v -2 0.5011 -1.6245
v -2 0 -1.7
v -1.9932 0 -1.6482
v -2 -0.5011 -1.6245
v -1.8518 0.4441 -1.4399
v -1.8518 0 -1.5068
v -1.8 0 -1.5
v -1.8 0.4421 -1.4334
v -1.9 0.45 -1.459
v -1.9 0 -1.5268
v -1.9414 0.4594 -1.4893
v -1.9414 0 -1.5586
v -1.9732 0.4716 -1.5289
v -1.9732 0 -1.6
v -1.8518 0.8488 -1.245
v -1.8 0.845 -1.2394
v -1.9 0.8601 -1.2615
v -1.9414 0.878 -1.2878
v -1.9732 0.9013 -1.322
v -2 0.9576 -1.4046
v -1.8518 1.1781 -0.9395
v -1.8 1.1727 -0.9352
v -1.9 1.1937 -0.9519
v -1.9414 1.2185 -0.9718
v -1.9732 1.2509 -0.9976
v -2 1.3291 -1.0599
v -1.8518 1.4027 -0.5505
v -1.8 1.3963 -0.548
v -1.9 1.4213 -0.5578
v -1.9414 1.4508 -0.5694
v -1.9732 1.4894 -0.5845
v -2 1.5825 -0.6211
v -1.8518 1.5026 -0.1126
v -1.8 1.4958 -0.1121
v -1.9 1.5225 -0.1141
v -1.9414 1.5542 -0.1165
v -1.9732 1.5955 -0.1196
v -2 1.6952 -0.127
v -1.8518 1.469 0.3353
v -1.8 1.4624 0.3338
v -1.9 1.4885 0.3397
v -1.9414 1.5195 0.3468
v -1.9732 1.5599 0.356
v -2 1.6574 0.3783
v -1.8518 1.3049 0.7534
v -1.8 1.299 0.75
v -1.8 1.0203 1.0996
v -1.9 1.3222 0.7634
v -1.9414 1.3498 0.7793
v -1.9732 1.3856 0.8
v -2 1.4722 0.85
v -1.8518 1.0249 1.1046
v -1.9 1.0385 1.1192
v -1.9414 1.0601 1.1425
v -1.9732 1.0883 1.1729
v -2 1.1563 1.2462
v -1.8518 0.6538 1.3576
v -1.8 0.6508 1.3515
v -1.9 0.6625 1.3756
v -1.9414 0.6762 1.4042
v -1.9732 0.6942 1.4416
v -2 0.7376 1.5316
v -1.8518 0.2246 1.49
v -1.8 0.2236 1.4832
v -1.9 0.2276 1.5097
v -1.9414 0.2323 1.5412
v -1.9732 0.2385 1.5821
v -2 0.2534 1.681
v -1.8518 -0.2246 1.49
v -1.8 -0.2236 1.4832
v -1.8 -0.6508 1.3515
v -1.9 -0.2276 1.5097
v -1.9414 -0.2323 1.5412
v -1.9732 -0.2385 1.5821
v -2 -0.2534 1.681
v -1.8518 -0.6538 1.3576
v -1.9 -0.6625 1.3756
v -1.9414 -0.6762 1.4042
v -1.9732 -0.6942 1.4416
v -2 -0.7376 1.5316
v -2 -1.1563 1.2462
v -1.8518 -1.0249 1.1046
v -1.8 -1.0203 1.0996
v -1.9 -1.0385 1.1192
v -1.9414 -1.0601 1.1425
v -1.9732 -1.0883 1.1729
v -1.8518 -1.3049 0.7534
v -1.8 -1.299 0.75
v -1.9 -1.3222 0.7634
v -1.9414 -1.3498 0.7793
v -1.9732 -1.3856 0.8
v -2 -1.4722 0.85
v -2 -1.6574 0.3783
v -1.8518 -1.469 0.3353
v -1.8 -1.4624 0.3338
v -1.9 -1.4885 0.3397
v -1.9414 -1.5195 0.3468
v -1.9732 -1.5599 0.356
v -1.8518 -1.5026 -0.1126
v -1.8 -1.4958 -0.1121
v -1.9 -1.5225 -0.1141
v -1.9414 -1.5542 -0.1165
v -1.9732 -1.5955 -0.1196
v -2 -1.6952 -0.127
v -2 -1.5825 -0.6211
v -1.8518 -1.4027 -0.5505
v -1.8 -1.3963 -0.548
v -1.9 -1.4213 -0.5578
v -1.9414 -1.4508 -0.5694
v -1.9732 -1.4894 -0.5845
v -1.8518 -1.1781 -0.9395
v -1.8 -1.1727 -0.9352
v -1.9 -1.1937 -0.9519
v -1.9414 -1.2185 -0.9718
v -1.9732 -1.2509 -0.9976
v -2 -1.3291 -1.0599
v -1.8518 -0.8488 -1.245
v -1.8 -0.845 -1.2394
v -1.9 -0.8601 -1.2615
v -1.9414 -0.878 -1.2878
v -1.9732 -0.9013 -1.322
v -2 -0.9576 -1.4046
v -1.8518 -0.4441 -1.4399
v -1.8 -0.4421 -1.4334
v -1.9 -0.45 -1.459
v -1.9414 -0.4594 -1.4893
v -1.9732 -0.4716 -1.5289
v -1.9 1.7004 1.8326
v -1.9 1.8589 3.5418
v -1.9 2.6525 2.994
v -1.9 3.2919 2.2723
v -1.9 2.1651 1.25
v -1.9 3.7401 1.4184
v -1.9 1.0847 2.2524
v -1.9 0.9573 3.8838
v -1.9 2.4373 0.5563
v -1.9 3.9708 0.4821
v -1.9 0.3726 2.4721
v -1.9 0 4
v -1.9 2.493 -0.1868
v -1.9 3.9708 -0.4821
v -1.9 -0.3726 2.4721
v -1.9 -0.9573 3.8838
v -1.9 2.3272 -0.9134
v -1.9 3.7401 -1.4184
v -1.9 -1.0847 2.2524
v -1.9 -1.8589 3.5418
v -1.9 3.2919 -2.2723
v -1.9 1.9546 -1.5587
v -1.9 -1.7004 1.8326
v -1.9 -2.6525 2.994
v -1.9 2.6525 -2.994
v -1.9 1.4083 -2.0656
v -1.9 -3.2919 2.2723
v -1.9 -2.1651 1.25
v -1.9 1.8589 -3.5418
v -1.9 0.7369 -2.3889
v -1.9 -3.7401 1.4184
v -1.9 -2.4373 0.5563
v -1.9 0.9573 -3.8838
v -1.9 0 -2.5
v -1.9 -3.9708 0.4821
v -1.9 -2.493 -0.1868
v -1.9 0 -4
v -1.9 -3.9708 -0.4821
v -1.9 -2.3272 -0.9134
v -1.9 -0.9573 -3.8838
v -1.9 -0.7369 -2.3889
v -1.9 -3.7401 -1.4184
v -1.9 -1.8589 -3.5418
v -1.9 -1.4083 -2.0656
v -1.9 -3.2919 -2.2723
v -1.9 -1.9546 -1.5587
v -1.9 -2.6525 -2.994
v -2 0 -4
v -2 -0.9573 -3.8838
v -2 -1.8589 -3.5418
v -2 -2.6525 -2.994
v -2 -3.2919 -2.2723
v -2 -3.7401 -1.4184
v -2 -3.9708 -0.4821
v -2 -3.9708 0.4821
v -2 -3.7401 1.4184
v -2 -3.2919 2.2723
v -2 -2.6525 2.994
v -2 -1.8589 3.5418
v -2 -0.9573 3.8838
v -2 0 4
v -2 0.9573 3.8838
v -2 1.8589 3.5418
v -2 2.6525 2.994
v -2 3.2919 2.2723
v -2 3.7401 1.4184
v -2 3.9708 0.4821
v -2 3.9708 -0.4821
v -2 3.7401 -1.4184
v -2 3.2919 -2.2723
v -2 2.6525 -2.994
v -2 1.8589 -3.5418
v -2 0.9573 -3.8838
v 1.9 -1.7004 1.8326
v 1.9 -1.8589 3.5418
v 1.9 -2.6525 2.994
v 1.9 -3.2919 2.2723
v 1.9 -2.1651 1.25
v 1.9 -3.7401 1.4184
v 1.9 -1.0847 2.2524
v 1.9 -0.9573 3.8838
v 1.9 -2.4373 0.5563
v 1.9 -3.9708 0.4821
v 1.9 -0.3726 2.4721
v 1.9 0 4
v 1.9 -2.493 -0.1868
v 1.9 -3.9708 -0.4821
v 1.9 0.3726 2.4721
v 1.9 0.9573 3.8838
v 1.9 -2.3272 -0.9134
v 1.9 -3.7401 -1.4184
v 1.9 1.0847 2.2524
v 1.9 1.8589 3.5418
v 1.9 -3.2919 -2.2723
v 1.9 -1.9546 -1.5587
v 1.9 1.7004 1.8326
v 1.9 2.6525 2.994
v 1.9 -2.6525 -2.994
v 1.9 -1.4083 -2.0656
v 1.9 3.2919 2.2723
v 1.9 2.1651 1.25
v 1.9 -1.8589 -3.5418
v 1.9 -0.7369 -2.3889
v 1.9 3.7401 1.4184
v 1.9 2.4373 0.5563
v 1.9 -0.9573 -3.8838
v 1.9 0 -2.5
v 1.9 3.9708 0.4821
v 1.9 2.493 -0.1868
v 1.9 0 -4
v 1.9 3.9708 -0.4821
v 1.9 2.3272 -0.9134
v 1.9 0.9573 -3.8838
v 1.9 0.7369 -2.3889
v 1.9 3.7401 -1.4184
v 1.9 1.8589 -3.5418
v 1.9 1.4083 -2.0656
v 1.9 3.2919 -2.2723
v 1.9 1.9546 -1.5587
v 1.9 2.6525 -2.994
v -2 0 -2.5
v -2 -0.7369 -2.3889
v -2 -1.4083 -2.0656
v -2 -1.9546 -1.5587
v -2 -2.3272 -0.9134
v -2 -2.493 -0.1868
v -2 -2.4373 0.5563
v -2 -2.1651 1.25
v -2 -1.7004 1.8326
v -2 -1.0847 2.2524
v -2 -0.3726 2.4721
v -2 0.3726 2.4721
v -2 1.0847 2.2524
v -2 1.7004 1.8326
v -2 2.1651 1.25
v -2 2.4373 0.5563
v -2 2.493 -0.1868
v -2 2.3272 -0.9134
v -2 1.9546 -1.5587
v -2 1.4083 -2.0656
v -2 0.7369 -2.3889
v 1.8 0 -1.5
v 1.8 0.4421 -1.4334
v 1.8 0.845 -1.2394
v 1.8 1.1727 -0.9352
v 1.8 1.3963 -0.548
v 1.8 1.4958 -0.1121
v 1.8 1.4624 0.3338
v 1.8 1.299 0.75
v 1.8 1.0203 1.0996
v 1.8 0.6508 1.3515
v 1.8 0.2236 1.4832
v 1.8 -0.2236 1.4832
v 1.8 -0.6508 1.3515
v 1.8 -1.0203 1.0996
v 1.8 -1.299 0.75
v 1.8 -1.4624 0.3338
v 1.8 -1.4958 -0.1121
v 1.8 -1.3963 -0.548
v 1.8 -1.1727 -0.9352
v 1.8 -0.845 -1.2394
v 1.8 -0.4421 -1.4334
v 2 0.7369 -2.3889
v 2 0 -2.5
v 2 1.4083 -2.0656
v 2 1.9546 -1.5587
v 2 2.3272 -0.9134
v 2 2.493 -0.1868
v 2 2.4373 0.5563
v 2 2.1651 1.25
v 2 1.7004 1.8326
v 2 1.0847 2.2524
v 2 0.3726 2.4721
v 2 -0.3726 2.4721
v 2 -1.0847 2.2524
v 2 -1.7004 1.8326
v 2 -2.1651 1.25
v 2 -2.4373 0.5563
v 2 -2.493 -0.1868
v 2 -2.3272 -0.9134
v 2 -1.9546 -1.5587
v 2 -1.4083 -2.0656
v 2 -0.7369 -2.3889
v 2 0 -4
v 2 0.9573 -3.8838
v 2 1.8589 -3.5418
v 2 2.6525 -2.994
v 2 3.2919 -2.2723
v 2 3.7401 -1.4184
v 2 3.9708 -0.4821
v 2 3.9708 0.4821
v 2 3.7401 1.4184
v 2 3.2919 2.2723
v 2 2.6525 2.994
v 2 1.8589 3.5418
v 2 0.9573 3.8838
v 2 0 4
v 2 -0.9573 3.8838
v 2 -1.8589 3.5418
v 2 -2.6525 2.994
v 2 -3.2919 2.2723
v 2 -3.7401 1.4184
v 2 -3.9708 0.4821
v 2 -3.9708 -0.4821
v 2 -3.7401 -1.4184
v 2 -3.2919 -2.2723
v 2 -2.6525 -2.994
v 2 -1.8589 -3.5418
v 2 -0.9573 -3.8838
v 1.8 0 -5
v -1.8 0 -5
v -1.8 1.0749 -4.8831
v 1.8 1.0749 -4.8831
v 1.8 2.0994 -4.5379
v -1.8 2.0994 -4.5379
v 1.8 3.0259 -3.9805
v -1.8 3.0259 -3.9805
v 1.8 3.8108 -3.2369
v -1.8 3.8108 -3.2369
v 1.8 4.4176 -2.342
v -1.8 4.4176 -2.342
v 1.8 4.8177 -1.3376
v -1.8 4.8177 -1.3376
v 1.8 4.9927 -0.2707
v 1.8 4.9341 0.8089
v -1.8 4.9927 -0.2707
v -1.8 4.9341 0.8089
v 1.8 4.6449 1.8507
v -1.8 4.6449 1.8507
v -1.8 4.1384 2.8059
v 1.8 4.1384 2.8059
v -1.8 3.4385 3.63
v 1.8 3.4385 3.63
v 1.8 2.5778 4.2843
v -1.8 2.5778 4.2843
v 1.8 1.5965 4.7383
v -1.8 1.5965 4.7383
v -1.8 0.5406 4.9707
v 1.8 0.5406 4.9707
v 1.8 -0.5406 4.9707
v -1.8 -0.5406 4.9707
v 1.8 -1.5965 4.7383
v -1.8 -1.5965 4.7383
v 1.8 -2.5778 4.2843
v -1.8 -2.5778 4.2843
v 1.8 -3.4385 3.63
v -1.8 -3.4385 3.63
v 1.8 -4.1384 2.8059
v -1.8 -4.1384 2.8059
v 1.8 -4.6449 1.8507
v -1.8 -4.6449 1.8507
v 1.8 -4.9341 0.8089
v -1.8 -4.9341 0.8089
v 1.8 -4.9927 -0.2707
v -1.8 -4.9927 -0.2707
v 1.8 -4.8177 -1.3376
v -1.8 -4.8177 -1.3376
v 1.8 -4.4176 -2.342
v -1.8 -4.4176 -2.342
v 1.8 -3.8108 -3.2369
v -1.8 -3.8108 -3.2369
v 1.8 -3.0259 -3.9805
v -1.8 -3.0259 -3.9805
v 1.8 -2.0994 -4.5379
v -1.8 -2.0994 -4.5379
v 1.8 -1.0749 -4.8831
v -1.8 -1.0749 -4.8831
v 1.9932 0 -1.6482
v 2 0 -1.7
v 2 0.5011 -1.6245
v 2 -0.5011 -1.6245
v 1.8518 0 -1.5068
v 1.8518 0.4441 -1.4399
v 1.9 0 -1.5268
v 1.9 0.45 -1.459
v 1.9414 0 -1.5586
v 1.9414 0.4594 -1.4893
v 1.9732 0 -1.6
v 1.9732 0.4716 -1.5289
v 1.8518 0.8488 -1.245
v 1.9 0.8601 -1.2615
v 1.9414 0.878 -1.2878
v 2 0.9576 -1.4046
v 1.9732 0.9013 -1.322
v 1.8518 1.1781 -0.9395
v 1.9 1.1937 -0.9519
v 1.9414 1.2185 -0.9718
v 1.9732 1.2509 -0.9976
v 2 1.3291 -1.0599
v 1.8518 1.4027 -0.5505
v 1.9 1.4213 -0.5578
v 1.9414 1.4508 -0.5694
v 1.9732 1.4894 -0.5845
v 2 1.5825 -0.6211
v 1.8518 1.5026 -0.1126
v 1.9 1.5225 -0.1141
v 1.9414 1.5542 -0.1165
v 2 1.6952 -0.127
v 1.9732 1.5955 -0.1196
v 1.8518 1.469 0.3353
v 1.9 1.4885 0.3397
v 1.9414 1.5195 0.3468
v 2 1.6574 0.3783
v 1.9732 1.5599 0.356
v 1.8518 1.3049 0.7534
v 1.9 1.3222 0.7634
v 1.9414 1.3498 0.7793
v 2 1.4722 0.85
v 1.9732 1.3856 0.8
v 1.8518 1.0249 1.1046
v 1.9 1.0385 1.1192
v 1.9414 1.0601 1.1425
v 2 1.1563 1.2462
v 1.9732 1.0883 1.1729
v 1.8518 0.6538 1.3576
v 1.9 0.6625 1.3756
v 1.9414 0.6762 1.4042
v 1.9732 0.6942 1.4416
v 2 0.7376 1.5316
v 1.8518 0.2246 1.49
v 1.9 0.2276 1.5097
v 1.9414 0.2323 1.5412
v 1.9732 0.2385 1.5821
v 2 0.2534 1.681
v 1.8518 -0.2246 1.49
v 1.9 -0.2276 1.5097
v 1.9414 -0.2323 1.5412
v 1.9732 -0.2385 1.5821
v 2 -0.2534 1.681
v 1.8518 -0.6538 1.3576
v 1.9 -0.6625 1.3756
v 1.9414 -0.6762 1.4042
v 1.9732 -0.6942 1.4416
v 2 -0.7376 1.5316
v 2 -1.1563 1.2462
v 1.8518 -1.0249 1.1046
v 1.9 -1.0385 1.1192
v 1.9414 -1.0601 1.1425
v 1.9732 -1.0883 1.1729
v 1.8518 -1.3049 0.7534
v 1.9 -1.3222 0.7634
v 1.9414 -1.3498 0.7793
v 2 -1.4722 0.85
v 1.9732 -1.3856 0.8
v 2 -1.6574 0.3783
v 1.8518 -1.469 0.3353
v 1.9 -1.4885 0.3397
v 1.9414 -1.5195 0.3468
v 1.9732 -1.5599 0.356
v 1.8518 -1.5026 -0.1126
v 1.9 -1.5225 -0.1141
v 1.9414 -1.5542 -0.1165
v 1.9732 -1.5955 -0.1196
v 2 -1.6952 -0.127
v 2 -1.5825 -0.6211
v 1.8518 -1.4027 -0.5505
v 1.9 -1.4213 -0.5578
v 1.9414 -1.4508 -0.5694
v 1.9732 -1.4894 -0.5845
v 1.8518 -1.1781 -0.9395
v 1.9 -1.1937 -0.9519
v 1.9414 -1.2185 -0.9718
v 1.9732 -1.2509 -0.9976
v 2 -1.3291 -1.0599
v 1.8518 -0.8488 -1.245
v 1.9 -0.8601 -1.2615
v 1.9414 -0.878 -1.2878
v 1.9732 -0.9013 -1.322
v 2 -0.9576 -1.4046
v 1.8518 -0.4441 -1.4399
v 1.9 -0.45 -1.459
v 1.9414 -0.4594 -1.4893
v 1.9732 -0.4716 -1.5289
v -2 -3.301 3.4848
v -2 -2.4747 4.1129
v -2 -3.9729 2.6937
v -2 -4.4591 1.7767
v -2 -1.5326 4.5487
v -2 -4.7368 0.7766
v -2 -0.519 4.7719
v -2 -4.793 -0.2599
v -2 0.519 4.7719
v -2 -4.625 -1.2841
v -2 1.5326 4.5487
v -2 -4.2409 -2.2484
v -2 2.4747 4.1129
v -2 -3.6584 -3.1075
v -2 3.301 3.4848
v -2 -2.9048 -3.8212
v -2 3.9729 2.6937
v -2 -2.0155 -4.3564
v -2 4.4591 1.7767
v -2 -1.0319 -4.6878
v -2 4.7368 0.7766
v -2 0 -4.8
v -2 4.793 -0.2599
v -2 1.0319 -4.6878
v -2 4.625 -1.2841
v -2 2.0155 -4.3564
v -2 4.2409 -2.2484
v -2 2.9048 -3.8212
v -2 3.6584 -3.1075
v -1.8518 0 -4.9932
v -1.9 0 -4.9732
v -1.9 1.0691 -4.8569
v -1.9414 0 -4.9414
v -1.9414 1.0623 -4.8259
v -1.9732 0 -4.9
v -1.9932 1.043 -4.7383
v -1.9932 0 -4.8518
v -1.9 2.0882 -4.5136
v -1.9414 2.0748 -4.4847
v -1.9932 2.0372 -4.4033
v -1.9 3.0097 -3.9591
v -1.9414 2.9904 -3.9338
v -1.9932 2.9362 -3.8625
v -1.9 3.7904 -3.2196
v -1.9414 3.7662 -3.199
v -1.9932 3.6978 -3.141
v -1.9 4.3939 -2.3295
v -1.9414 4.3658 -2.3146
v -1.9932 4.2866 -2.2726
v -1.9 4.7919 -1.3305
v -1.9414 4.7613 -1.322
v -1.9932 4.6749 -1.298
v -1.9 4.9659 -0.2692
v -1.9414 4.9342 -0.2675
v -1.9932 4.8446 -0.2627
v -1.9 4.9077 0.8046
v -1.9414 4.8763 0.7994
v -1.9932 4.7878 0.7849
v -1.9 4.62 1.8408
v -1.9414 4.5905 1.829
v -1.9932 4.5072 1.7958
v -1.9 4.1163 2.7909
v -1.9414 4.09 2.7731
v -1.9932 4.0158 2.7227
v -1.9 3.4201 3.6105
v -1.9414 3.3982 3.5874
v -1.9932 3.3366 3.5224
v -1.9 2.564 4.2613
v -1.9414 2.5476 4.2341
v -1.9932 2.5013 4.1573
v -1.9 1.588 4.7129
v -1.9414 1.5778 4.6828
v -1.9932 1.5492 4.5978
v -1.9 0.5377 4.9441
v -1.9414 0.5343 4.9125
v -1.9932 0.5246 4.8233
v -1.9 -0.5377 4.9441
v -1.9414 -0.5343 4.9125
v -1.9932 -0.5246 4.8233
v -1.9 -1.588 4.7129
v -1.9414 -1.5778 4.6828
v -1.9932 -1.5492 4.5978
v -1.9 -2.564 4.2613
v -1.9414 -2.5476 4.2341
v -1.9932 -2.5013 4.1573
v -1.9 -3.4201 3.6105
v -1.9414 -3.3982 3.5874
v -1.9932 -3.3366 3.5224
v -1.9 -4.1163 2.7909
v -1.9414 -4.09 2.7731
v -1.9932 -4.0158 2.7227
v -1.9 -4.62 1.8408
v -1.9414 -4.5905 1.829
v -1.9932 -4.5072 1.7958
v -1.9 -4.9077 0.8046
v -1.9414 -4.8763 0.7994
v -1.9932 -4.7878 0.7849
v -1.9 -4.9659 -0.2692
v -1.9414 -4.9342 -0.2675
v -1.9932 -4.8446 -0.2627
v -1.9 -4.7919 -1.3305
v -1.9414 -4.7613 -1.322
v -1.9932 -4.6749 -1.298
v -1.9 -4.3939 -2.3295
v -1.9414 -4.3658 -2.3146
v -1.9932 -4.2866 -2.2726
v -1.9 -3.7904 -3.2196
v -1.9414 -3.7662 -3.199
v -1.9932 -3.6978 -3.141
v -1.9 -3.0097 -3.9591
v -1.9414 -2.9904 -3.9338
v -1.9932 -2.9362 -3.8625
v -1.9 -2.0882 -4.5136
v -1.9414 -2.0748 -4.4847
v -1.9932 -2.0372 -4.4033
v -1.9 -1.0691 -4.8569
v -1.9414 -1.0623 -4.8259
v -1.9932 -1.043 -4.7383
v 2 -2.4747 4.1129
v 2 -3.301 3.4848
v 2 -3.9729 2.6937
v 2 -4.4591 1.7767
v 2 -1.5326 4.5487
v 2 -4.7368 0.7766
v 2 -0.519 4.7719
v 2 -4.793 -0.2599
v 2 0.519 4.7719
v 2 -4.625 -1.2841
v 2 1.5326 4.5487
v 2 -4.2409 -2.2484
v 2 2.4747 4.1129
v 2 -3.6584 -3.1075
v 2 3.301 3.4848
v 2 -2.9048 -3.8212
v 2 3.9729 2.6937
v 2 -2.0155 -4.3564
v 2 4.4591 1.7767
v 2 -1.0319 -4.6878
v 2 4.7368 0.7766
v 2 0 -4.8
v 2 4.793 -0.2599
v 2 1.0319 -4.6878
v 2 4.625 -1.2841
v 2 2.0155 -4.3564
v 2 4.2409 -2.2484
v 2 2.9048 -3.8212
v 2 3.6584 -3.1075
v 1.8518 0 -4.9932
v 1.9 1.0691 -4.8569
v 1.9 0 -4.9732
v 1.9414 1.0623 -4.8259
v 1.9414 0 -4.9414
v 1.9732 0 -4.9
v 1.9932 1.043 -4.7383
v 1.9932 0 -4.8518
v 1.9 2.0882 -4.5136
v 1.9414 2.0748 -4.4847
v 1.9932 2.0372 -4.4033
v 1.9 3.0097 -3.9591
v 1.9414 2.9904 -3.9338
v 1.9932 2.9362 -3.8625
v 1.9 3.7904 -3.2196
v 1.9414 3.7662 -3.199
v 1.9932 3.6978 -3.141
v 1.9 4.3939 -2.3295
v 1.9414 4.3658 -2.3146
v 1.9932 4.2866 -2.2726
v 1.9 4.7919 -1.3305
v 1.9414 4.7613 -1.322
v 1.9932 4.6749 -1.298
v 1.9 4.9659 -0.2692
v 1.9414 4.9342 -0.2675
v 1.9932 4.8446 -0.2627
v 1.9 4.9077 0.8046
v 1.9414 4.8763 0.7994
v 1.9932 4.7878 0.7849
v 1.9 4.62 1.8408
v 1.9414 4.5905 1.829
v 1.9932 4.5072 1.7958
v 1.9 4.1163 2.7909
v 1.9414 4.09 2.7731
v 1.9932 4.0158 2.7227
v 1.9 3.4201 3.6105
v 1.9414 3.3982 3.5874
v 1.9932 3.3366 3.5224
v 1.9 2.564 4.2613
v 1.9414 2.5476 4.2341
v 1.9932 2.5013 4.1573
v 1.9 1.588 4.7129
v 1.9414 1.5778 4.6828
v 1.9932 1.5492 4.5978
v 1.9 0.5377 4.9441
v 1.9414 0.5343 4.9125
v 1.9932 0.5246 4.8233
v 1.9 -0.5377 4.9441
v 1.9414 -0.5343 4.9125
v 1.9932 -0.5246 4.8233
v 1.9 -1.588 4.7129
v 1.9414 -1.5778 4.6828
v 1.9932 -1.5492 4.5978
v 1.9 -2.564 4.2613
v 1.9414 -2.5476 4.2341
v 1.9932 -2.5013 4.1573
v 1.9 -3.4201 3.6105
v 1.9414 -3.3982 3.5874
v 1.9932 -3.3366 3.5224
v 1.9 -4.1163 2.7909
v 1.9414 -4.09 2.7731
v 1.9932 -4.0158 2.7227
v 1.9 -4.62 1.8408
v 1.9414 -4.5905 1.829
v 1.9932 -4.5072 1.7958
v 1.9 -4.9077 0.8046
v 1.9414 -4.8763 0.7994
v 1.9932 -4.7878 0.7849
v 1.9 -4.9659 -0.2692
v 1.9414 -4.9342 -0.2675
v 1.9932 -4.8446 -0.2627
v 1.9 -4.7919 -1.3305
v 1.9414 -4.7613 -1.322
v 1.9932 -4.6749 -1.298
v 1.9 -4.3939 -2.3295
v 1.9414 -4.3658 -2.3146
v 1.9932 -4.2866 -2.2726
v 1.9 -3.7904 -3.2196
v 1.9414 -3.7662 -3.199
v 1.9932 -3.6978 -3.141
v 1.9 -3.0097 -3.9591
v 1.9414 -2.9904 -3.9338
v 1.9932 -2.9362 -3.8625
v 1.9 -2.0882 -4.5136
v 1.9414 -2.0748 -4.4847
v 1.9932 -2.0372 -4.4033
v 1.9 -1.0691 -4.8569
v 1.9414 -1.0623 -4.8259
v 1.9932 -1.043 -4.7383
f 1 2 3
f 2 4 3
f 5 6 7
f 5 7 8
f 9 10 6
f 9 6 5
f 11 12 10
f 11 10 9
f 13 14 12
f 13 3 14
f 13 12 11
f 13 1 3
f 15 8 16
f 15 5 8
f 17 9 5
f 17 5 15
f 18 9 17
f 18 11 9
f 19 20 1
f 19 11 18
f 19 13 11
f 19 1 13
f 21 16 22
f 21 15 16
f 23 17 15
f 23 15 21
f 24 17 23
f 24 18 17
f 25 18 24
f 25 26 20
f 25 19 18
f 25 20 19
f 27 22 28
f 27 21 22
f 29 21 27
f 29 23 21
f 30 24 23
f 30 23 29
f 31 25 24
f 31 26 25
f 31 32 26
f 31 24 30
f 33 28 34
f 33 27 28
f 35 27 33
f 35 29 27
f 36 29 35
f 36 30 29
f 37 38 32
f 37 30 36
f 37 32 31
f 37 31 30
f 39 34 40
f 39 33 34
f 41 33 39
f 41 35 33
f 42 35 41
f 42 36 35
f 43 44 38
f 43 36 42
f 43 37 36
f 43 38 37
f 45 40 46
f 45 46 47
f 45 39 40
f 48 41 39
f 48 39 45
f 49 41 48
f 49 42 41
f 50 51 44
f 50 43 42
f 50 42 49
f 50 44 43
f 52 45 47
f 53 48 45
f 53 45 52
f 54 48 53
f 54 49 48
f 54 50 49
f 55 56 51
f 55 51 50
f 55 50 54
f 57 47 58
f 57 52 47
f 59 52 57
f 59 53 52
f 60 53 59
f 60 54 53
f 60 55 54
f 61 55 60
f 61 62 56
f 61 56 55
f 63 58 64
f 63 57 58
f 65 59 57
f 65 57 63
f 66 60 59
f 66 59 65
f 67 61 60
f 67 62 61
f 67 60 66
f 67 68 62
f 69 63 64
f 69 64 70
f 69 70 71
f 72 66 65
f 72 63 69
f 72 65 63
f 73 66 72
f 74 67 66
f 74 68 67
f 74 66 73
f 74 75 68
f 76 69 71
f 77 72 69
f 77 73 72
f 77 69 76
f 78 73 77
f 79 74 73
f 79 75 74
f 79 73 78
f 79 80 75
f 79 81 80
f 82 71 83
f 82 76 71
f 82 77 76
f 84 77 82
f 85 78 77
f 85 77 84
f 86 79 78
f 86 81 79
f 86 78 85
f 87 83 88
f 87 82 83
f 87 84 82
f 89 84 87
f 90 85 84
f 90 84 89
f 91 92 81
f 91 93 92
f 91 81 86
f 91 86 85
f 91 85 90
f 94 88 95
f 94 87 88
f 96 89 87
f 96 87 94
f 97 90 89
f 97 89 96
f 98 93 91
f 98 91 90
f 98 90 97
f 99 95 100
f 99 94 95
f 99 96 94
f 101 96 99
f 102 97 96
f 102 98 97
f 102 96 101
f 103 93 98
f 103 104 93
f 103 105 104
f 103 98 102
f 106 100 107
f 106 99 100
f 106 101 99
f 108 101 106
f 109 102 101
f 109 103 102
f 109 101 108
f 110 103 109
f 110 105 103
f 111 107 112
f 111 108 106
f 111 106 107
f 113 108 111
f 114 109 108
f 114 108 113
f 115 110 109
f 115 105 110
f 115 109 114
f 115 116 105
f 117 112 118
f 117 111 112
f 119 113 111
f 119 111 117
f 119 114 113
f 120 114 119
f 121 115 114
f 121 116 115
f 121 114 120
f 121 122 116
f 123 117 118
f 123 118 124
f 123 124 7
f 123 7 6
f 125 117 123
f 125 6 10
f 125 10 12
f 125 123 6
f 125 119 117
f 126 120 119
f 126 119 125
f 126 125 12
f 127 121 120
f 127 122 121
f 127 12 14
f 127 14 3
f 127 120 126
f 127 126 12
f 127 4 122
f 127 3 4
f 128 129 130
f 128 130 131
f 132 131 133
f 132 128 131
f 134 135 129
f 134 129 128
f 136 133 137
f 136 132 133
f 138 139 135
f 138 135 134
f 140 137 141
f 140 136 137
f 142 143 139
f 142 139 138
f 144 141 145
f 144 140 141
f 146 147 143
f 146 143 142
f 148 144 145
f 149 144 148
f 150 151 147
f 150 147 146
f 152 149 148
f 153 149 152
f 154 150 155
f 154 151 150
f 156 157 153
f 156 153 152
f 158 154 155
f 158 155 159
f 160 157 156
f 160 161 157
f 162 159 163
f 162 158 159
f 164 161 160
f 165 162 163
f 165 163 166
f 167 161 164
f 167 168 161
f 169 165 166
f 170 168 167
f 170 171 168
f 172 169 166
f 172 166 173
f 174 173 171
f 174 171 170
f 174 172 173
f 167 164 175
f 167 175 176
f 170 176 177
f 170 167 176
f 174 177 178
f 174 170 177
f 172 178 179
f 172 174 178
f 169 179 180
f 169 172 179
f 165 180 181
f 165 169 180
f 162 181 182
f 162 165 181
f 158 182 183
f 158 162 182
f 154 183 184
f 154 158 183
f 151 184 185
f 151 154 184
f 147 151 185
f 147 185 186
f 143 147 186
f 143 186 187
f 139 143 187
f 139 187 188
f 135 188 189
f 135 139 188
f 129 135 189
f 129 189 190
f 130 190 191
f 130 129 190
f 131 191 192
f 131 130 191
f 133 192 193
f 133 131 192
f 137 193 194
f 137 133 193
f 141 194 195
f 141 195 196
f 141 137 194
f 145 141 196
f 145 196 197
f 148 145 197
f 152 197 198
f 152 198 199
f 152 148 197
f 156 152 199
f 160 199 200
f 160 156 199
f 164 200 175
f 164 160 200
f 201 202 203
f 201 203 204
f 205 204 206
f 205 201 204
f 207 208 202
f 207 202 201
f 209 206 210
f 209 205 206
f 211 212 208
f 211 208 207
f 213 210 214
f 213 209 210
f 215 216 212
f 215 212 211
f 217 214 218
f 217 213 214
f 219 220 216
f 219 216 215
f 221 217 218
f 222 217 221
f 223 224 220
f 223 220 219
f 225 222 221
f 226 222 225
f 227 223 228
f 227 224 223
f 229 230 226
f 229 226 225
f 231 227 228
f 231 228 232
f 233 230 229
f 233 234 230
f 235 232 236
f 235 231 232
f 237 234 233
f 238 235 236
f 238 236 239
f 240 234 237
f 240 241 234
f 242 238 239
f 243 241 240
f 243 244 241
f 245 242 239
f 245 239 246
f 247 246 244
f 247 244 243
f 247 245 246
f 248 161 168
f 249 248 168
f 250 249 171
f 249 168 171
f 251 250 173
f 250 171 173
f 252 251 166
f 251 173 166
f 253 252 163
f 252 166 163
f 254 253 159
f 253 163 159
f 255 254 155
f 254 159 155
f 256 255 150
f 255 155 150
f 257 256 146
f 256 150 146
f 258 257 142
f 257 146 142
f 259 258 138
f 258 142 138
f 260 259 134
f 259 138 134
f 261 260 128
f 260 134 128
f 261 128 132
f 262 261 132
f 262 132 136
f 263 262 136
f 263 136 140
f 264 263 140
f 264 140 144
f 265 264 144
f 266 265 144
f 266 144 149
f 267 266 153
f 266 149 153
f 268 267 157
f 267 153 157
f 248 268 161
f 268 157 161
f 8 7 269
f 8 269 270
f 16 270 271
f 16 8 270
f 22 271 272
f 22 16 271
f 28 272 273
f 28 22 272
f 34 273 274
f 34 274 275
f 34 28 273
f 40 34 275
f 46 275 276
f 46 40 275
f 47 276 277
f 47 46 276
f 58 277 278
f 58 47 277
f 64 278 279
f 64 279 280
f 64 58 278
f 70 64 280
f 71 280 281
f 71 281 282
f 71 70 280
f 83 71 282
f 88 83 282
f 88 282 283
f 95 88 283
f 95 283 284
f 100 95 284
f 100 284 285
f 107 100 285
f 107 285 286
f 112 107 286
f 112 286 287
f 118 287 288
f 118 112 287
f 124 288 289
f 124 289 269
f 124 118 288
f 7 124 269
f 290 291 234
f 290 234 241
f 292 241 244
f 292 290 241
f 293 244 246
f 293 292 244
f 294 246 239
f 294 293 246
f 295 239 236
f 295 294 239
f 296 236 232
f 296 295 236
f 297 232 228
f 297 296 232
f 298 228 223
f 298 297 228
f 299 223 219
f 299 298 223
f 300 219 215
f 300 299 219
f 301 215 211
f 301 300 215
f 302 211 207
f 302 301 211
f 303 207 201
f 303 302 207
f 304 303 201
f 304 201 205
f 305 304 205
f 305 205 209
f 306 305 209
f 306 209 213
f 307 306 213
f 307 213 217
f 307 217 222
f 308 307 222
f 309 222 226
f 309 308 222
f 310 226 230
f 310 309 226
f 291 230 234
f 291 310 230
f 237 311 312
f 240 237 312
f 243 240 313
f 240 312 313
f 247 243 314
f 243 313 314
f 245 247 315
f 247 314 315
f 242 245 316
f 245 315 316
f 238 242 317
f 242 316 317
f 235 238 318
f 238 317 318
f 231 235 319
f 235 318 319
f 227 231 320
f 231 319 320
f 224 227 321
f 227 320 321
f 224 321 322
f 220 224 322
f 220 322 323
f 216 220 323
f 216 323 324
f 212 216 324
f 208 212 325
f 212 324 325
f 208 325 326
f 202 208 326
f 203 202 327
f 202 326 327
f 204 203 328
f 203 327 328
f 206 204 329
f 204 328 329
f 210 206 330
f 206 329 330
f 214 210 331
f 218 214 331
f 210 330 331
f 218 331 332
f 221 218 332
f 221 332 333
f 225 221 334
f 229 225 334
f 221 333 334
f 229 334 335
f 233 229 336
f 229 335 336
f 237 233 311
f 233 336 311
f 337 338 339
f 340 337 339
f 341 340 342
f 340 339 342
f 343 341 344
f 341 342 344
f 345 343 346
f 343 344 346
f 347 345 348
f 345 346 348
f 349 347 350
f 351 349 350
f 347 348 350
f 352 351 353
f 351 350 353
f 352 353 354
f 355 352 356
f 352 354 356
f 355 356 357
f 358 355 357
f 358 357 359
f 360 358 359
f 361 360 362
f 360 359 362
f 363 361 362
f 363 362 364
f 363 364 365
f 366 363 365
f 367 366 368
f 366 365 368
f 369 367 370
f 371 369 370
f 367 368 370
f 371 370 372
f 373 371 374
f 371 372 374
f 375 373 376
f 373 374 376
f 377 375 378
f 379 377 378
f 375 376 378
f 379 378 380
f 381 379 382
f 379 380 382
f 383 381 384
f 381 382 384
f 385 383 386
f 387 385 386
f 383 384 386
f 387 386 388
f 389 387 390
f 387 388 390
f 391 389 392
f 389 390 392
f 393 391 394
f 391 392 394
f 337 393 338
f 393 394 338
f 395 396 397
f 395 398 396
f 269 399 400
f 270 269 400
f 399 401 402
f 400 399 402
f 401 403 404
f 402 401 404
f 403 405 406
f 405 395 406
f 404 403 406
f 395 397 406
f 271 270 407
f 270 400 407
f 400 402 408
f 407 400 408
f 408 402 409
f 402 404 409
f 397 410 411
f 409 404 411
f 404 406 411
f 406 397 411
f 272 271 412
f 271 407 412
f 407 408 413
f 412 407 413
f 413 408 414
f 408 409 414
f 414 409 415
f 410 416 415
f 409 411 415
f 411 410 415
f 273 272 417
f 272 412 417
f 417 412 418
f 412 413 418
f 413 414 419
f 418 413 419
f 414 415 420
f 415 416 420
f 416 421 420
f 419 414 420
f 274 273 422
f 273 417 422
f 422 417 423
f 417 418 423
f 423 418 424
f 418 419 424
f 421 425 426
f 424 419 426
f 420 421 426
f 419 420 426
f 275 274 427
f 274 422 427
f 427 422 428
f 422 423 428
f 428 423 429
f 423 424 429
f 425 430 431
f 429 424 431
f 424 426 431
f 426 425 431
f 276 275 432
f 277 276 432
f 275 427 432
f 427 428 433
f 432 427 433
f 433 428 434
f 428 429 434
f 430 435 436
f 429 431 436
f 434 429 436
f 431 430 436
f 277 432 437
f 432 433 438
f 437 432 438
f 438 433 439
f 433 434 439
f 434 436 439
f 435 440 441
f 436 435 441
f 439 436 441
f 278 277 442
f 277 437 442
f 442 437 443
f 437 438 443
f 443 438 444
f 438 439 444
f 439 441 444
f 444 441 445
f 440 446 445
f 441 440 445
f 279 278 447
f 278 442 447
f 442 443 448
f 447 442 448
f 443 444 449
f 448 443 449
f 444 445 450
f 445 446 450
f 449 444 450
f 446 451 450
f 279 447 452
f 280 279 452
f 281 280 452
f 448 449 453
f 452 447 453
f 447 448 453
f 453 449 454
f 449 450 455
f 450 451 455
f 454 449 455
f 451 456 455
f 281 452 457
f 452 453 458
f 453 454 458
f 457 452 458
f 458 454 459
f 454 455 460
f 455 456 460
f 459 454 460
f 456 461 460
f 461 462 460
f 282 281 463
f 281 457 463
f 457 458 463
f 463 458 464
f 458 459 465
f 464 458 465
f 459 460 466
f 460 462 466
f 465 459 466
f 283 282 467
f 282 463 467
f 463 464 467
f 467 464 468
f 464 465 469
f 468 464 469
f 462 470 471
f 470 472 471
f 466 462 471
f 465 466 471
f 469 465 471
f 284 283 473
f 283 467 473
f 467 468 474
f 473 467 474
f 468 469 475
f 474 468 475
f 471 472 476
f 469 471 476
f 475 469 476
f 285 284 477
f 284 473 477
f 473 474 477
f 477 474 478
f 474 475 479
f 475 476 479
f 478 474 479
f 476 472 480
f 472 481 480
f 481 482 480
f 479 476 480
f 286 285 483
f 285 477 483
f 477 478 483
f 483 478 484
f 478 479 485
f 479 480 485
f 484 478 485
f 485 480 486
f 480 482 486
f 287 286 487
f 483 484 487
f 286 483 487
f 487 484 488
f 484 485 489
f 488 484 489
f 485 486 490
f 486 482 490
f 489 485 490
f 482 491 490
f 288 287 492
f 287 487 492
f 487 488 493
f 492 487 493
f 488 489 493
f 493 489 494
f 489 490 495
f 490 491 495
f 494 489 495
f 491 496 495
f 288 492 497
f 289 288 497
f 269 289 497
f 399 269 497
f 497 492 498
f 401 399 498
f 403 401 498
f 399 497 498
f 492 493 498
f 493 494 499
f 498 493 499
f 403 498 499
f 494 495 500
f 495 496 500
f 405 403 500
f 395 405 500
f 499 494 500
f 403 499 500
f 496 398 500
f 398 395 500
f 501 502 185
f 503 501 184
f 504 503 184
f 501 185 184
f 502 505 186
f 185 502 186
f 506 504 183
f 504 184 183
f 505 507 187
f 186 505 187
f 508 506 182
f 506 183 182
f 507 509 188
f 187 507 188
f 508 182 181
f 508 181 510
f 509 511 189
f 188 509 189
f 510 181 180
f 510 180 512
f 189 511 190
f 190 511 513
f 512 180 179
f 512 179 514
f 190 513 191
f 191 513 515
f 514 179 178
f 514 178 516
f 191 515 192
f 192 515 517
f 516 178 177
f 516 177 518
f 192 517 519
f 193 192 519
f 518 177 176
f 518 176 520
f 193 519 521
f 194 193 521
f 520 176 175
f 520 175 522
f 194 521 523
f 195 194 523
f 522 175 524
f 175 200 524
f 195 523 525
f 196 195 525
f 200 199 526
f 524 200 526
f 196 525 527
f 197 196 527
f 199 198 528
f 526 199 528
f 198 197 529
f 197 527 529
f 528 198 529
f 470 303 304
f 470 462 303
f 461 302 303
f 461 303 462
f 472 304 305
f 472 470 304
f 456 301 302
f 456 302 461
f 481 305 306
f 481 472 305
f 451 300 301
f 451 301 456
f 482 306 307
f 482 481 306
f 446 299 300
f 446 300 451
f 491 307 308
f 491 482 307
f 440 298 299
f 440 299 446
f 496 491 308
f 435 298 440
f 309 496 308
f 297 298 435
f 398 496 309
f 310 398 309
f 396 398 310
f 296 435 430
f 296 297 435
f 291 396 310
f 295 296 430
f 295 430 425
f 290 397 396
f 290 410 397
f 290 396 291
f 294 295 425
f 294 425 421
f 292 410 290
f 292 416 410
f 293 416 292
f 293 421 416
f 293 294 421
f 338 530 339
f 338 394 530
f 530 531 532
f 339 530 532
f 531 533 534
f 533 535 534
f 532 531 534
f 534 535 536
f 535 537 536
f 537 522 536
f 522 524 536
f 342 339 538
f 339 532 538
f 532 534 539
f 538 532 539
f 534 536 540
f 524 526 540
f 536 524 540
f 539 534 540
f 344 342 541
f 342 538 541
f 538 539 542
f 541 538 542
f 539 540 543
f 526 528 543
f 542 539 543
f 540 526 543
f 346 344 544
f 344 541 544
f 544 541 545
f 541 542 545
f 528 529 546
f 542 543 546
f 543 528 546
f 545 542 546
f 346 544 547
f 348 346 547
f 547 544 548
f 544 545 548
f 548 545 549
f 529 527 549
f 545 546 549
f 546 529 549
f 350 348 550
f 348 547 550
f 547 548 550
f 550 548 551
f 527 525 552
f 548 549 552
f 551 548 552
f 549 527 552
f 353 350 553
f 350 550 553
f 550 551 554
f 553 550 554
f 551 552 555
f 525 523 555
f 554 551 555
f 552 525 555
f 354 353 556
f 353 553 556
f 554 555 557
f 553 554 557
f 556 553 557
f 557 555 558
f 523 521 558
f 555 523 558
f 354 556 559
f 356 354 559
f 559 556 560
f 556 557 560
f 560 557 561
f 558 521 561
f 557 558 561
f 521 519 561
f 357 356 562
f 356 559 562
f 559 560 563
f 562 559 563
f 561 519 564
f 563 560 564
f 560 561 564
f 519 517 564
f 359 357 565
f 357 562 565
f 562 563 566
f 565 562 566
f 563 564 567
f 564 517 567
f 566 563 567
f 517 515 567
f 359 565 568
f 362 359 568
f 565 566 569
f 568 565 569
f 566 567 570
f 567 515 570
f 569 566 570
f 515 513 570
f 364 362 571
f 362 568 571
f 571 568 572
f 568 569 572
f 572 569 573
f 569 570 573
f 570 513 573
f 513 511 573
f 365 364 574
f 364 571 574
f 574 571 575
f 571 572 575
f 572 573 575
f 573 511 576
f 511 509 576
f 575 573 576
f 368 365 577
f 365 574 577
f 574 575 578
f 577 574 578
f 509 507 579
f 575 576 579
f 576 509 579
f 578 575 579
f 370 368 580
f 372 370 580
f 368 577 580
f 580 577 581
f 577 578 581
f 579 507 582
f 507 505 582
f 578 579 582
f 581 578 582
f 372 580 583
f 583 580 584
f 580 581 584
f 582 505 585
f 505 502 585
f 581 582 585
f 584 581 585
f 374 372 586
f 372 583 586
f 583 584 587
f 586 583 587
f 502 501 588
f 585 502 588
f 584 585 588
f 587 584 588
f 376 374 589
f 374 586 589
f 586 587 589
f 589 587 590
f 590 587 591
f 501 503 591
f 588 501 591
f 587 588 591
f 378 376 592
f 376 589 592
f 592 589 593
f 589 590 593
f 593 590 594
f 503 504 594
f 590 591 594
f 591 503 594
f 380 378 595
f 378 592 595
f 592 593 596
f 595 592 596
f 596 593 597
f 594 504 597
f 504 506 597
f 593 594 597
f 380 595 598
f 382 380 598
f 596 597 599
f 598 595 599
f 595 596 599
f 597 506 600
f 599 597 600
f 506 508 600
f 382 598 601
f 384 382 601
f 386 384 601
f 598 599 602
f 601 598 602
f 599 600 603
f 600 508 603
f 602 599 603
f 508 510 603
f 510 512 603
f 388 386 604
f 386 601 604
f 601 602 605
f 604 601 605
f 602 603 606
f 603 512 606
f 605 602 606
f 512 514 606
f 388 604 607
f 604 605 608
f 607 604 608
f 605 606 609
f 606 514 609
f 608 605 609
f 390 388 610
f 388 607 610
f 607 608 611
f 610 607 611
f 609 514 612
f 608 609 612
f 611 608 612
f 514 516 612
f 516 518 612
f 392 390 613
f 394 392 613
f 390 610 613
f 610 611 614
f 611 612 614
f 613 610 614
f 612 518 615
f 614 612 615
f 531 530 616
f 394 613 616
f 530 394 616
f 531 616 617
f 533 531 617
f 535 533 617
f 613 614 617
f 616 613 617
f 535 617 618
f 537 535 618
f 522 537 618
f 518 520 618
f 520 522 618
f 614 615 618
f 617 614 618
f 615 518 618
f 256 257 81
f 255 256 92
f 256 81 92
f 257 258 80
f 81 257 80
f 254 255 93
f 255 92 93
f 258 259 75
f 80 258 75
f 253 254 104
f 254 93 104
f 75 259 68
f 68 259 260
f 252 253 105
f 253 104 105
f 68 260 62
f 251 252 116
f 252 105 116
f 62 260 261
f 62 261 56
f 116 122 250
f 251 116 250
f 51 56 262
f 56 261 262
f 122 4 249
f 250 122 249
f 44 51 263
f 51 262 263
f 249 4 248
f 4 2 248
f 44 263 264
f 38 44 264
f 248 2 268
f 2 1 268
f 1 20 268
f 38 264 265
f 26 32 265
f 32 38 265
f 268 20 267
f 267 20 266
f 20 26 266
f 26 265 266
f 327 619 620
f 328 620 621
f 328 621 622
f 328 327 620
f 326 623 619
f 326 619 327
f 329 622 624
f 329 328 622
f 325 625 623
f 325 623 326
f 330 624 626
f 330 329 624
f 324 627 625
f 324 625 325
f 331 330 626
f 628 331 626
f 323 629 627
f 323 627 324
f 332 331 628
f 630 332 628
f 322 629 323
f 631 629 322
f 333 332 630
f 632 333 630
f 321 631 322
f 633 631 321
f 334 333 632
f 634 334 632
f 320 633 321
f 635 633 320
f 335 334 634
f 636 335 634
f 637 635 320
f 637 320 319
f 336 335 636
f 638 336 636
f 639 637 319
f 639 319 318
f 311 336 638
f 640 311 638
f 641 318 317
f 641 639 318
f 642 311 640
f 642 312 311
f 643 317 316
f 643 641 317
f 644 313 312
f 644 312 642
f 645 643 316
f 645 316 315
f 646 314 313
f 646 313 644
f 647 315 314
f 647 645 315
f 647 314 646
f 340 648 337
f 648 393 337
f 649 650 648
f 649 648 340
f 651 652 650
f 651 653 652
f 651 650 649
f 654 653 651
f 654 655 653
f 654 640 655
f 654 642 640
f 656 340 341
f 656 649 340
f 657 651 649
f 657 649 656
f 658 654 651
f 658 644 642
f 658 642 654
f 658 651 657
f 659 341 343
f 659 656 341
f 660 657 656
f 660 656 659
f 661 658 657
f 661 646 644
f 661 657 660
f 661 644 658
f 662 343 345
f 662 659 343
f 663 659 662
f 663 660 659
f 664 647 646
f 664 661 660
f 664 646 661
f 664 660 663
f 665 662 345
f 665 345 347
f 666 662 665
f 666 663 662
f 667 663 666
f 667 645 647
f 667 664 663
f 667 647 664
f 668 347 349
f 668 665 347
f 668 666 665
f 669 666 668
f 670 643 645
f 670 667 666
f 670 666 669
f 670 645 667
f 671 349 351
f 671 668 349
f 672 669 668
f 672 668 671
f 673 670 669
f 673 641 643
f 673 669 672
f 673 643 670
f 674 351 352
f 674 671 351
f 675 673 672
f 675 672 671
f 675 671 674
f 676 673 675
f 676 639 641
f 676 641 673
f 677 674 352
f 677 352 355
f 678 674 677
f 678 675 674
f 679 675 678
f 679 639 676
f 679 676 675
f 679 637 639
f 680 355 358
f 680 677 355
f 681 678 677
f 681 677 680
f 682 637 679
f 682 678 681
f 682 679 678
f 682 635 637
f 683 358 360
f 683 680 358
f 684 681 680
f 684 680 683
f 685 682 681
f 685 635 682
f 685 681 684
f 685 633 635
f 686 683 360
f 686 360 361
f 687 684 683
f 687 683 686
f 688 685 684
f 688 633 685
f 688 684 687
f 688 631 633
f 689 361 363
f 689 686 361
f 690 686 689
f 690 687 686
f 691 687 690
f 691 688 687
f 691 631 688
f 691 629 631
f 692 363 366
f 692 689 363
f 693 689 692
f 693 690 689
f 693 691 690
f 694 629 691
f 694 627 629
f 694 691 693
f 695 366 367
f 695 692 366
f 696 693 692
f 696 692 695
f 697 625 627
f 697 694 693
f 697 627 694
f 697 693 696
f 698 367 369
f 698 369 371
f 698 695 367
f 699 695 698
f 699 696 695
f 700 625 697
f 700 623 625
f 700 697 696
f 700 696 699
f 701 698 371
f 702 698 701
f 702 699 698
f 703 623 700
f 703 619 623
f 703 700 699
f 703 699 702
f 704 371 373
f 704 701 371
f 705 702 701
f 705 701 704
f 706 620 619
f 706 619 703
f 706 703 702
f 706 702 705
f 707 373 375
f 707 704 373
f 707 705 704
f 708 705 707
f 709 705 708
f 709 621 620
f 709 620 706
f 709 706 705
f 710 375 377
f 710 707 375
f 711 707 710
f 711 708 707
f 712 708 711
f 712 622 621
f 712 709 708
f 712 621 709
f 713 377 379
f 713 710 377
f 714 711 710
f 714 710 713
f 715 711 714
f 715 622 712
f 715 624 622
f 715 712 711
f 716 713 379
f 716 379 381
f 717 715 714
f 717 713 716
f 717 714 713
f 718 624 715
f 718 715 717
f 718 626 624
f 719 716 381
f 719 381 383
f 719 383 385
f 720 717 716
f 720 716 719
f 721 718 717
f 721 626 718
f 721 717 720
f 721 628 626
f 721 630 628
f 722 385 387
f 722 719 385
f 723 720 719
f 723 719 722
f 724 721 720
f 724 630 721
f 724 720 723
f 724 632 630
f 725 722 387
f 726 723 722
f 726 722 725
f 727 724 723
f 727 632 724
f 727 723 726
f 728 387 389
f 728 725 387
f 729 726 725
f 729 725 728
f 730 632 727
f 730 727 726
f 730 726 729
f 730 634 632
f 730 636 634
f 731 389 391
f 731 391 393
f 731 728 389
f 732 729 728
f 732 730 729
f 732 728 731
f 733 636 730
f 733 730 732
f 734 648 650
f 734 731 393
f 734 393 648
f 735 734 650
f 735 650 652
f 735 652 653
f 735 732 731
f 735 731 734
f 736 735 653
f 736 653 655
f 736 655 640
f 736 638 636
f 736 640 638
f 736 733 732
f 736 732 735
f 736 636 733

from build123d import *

# Parameters (mm, degrees)
BOSS_EXTRUDE1_DEPTH      = 2
BOSS_EXTRUDE1_DEPTH_BACK = 2
SKETCH1_R                = 5
SKETCH1_R_2              = 1.5
FILLET1_R                = 0.2
SKETCH2_R                = 4
SKETCH2_R_2              = 2.5
CUT_EXTRUDE1_DEPTH       = 0.1
CUT_EXTRUDE2_START       = -0.1
SKETCH3_R                = 4
SKETCH3_R_2              = 2.5
CUT_EXTRUDE2_DEPTH       = 0.1


with BuildPart() as part:
    # Sketch1 → Boss-Extrude1 (new, two sides: drawn at the far end of the back side and taken through both)
    with BuildSketch(Plane(origin=(0, 0, 0), x_dir=(0, 0, -1), z_dir=(1, 0, 0)).offset(-BOSS_EXTRUDE1_DEPTH_BACK)):
        Circle(SKETCH1_R)
        Circle(SKETCH1_R_2, mode=Mode.SUBTRACT)
    extrude(amount=BOSS_EXTRUDE1_DEPTH + BOSS_EXTRUDE1_DEPTH_BACK)

    # Fillet1
    fillet1_edges = [part.edges().sort_by_distance(p)[0] for p in [
        (-2, 0, 1.5),
        (2, 0, 1.5),
        (-2, 0, 5),
        (2, 0, 5),
    ]]
    fillet(fillet1_edges, radius=FILLET1_R)

    # Sketch2 → Cut-Extrude1 (cut)
    with BuildSketch(Plane(origin=(2, 0, 0), x_dir=(0, 0, -1), z_dir=(1, 0, 0))):
        Circle(SKETCH2_R)
        Circle(SKETCH2_R_2, mode=Mode.SUBTRACT)
    extrude(amount=-CUT_EXTRUDE1_DEPTH, mode=Mode.SUBTRACT)

    # Sketch3 → Cut-Extrude2 (cut)
    with BuildSketch(Plane.ZY.offset(2).offset(CUT_EXTRUDE2_START)):
        Circle(SKETCH3_R)
        Circle(SKETCH3_R_2, mode=Mode.SUBTRACT)
    extrude(amount=CUT_EXTRUDE2_DEPTH, mode=Mode.SUBTRACT)


solid = part.part
